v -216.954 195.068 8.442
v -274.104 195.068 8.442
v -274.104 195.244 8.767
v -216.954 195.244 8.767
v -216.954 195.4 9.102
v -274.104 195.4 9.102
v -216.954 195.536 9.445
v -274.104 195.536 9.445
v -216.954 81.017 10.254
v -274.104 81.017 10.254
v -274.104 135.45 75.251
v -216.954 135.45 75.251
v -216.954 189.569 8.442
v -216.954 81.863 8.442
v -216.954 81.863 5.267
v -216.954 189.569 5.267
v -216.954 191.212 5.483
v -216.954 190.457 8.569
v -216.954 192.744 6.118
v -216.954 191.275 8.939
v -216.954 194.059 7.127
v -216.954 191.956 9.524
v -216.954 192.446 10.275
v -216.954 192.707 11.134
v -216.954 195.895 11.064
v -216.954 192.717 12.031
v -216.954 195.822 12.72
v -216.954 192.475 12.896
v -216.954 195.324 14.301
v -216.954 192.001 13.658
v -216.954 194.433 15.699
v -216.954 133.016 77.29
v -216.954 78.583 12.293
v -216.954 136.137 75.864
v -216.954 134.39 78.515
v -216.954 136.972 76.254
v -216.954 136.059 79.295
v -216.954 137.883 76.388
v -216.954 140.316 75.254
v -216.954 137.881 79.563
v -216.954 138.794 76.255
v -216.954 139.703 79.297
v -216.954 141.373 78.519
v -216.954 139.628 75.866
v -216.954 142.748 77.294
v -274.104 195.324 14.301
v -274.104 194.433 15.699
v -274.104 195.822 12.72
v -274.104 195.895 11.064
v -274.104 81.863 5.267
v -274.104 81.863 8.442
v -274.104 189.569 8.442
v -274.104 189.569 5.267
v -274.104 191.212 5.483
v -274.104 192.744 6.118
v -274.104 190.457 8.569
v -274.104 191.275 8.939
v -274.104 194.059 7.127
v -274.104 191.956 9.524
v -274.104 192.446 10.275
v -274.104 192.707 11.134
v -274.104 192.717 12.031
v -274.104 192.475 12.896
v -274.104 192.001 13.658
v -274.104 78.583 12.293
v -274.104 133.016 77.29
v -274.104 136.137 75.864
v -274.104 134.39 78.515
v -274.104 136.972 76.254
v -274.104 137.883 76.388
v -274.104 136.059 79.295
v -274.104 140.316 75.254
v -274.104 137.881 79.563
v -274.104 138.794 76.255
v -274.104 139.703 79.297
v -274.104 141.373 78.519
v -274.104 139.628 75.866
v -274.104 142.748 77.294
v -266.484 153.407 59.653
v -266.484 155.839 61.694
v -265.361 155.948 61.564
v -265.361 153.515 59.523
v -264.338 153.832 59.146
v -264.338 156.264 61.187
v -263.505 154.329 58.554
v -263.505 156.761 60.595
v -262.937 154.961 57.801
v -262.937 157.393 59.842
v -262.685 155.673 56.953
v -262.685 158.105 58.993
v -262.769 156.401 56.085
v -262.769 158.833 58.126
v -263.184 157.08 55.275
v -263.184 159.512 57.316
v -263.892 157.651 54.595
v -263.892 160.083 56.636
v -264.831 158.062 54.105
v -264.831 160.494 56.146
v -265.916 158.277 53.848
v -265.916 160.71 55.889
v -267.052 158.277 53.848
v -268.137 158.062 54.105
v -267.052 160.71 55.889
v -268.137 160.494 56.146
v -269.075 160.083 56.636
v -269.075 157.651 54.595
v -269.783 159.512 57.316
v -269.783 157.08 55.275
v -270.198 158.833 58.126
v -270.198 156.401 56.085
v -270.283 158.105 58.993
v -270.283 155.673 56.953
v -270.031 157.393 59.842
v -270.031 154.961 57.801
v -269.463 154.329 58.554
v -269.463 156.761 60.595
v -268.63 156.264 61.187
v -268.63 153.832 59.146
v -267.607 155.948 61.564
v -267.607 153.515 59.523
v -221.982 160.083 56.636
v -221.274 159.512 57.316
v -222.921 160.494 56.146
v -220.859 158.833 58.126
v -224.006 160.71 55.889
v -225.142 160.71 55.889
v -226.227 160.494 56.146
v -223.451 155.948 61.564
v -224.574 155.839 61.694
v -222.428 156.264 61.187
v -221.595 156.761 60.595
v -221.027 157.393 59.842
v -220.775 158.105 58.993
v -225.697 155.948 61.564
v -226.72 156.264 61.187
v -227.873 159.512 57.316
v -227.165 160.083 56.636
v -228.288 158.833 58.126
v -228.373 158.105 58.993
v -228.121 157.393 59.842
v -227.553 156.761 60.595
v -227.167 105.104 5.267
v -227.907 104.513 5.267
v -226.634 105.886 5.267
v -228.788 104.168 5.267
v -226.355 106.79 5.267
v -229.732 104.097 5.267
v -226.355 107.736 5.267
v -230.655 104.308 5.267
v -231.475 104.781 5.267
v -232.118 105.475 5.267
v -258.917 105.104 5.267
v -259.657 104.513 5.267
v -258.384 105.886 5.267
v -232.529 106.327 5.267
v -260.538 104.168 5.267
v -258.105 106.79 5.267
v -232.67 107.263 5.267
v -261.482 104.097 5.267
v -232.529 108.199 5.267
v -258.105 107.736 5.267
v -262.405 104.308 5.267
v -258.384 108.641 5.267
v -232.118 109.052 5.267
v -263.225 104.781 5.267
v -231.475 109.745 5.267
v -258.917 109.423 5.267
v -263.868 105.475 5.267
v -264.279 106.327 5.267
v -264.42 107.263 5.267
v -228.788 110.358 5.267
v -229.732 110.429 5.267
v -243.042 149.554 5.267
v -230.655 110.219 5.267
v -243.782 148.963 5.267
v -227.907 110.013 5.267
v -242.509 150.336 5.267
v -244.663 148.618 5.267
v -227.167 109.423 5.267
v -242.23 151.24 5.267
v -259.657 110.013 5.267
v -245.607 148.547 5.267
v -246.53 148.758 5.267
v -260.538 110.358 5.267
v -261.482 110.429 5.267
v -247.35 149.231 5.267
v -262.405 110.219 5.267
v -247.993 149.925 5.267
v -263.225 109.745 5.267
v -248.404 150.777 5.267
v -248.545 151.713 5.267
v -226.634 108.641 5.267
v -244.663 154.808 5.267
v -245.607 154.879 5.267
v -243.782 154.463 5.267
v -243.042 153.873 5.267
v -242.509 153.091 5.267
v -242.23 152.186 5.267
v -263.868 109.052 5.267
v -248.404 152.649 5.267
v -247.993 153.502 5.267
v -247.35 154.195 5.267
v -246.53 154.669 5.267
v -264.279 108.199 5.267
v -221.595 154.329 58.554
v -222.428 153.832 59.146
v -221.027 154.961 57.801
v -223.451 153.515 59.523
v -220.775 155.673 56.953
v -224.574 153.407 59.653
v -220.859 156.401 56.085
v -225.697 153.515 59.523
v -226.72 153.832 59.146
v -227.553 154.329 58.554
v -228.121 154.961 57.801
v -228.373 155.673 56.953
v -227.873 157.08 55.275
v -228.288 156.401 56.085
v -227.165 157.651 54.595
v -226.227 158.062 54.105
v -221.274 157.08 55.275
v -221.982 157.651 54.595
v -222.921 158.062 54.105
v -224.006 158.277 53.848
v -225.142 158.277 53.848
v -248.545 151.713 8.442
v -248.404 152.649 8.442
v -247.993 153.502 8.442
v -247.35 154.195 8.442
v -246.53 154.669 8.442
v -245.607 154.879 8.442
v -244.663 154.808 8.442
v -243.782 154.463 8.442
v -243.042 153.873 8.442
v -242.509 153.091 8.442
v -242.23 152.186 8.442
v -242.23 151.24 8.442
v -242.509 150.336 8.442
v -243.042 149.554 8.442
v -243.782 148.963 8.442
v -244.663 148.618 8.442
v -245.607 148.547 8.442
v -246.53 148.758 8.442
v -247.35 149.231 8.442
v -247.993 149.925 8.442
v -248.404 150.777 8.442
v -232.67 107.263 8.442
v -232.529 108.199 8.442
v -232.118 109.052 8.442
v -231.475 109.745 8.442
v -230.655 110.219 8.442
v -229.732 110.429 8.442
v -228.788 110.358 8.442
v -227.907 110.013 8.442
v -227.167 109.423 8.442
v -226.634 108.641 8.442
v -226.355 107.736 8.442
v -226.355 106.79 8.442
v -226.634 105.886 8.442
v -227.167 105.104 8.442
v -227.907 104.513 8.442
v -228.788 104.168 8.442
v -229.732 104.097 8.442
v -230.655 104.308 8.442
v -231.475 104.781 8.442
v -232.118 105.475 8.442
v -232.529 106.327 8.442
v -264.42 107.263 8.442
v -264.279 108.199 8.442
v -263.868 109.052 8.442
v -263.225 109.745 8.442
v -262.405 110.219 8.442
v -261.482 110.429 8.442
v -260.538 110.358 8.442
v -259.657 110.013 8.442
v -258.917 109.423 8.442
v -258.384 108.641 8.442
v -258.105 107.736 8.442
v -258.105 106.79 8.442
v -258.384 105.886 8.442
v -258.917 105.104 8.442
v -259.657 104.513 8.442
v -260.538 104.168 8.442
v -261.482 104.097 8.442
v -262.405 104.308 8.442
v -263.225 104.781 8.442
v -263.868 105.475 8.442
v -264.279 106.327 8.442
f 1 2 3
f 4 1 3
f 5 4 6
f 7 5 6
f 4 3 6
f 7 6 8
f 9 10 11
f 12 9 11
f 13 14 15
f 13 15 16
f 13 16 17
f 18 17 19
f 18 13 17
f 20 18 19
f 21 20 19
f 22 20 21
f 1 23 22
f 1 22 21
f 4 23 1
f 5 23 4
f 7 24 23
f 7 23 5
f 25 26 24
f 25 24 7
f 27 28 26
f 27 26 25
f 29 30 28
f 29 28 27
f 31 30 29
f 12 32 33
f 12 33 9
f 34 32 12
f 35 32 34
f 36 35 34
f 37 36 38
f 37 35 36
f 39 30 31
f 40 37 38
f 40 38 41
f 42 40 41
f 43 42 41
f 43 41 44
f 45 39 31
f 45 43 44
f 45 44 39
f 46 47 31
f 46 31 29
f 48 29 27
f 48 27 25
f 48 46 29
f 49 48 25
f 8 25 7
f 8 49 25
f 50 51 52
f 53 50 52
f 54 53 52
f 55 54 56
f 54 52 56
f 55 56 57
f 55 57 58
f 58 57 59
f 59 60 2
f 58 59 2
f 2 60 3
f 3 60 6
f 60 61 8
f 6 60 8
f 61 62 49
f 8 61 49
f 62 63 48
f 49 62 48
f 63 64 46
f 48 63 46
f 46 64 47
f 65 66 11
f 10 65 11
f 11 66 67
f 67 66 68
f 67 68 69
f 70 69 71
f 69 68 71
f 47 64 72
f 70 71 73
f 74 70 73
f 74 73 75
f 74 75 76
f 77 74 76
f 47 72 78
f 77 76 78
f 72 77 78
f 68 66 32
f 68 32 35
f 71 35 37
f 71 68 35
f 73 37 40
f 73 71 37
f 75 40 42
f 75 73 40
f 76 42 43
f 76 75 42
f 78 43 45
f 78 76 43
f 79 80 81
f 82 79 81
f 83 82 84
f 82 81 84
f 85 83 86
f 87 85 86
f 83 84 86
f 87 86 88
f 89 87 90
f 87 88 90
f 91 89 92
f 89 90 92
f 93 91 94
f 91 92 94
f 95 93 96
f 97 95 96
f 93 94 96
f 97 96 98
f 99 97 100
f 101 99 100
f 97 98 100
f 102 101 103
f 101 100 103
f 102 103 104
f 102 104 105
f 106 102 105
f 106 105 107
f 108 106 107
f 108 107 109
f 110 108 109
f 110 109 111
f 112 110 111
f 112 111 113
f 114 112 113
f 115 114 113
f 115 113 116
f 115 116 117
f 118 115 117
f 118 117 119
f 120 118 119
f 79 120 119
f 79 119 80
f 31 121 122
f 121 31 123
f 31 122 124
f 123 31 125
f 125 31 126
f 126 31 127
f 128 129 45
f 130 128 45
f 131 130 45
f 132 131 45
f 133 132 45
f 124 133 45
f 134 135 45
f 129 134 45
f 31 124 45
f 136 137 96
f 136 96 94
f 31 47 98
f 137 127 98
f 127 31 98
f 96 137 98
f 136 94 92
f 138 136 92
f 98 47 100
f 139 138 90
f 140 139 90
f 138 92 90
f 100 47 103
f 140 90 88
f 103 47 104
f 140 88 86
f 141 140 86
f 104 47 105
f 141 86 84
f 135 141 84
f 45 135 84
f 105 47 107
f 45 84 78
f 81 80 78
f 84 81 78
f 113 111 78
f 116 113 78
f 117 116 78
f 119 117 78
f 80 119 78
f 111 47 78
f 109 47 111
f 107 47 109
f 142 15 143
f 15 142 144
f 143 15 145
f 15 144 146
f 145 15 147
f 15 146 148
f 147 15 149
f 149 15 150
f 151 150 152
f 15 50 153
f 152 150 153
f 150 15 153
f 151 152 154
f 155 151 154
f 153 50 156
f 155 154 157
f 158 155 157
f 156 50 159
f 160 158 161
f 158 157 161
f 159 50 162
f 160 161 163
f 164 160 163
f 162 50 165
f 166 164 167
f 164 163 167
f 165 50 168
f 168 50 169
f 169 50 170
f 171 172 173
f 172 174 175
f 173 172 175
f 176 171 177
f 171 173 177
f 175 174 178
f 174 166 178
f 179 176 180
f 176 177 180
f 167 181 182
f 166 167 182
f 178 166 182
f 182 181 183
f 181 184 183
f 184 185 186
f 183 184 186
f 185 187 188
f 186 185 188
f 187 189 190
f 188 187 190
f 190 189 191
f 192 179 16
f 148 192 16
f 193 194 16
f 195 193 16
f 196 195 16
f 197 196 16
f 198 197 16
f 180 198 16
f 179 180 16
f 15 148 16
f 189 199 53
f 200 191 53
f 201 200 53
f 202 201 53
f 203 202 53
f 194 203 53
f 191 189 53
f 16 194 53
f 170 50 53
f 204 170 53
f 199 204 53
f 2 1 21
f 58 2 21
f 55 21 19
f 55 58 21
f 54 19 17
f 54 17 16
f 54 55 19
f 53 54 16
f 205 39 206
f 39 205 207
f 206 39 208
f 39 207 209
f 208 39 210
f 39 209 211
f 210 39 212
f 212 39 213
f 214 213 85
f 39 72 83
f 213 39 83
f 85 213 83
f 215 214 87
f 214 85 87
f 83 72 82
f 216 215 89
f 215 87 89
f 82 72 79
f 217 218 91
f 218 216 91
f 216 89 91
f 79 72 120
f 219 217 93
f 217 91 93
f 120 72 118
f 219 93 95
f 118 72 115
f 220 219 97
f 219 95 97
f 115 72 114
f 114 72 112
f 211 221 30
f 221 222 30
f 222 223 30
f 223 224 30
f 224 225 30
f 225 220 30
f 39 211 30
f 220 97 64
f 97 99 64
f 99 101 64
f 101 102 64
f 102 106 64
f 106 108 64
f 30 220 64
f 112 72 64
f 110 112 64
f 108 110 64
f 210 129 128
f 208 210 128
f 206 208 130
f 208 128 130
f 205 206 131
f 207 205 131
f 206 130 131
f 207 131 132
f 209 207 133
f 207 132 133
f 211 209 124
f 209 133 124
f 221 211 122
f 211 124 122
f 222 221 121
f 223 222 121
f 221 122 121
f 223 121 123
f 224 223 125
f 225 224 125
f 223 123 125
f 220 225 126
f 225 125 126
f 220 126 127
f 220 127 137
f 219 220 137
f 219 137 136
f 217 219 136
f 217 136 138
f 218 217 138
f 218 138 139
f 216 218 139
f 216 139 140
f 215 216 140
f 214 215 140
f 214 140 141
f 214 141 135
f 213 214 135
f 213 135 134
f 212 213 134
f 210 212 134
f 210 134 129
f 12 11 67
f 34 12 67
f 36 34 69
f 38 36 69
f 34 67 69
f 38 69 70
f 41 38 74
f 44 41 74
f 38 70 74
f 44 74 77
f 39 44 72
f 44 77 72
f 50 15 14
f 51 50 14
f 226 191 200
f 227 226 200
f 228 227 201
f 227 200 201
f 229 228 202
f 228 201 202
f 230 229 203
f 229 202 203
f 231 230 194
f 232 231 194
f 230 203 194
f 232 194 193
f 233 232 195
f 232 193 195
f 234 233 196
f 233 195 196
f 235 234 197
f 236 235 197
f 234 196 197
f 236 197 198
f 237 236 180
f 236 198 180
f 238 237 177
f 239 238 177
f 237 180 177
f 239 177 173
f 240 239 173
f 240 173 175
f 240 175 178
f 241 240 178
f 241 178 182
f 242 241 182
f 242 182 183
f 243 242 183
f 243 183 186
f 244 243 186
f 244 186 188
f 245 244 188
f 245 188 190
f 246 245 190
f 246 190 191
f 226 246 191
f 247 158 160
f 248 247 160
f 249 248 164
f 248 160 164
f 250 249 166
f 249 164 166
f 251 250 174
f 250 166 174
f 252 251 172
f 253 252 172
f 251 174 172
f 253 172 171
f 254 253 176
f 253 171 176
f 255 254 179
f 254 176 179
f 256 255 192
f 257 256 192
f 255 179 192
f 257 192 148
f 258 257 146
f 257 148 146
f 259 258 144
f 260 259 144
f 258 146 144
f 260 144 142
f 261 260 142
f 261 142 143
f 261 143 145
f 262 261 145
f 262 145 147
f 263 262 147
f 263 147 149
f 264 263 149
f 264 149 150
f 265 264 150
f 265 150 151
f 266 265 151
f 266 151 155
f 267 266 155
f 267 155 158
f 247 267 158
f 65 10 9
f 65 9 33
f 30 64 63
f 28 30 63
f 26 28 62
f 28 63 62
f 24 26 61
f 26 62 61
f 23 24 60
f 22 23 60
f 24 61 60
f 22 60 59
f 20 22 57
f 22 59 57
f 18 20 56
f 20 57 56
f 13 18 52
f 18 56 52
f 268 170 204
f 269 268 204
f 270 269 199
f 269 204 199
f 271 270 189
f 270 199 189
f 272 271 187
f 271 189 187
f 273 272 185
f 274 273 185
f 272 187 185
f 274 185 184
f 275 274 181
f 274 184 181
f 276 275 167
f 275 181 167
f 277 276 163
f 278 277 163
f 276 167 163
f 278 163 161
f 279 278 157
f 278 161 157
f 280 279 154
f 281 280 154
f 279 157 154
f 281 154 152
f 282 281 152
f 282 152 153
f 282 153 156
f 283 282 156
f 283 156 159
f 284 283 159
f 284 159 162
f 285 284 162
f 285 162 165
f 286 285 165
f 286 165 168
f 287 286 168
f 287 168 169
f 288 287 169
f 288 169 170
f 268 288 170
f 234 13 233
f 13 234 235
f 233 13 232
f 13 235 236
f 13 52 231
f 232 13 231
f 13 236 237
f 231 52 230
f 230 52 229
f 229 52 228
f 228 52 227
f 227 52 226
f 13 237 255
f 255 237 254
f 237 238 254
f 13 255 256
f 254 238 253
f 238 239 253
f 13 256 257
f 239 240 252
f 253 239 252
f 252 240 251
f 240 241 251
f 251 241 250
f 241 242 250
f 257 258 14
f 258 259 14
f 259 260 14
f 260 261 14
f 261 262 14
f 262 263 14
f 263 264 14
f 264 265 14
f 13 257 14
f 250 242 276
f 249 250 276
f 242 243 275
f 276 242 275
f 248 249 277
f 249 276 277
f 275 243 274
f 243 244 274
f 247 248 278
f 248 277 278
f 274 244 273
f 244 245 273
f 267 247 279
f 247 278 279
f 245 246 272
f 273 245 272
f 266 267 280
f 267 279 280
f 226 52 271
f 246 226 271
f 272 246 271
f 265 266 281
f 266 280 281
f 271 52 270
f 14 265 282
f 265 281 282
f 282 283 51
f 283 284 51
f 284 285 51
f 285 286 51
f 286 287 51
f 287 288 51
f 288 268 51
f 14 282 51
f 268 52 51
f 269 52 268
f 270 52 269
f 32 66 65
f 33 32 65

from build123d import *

# Parameters (mm, degrees)
BOSS_EXTRUDE1_START    = -63.5
BOSS_EXTRUDE1_DEPTH    = 57.15
SKETCH4_R              = 3.81
CUT_EXTRUDE2_DEPTH     = 12.7
CONVERT_SOLID3_START   = -274.103914115
CONVERT_SOLID3_DEPTH   = 57.15
CONVERT_SOLID3_2_DEPTH = 57.15
SKETCH13_R             = 3.175
CUT_EXTRUDE3_DEPTH     = 5.842


# Read off the part's stored shape, not the designer's step: Convert-Solid3
with BuildPart() as part:
    # Sketch3 → Boss-Extrude1 (new body)
    with BuildSketch(Plane.ZY.offset(337.603914115).offset(BOSS_EXTRUDE1_START)):
        Polygon((5.267071178, 203.186586599), (83.097186599, 137.879365455), (5.267071178, 72.698998764), align=None)
        Polygon((78.154944449, 137.881730876), (8.442071178, 196.377777126), (8.442071178, 79.499308876), align=None, mode=Mode.SUBTRACT)
    extrude(amount=-BOSS_EXTRUDE1_DEPTH)

    # Sketch4 → Cut-Extrude2 (cut)
    with BuildSketch(Plane(origin=(0, 121.82830981, 102.226089829), x_dir=(1, 0, 0), z_dir=(0, 0.7660444431189748, 0.6427876096865434))):
        with Locations(Location((-266.483914115, 56.721009713, 0), (0, 0, 270))):
            Circle(SKETCH4_R)
        with Locations(Location((-224.573914115, 56.721009713, 0), (0, 0, 270))):
            Circle(SKETCH4_R)
    extrude(amount=-CUT_EXTRUDE2_DEPTH, mode=Mode.SUBTRACT)

    # Convert-Solid3 outline → Convert-Solid3 (cut)
    with BuildSketch(Plane.YZ.offset(CONVERT_SOLID3_START)):
        Polygon((72.698998764, 5.267071178), (81.863084577, 5.267071178), (81.863084577, 8.442071178), (79.499308876, 8.442071178), (81.016980609, 10.254282003), (78.582837061, 12.292803573), align=None)
        with BuildLine():
            ThreePointArc((195.068228967, 8.442071178), (192.743967654, 6.117809864), (189.568967654, 5.267071178))
            Line((189.568967654, 5.267071178), (203.186586599, 5.267071178))
            Line((203.186586599, 5.267071178), (194.433349867, 15.6987725))
            ThreePointArc((194.433349867, 15.6987725), (195.822496885, 12.719737106), (195.536015795, 9.445243268))
            Line((195.536015795, 9.445243268), (196.377777126, 8.442071178))
            Line((196.377777126, 8.442071178), (195.068228967, 8.442071178))
        make_face()
        with BuildLine():
            Line((137.879365455, 83.097186599), (133.015809203, 77.289745437))
            ThreePointArc((133.015809203, 77.289745437), (137.881057106, 79.562701571), (142.748478512, 77.29440362))
            Line((142.748478512, 77.29440362), (137.879365455, 83.097186599))
        make_face()
    extrude(amount=CONVERT_SOLID3_DEPTH, mode=Mode.SUBTRACT)

    # Convert-Solid3 2 outline → Convert-Solid3 2 (add)
    with BuildSketch(Plane.YZ.offset(CONVERT_SOLID3_START)):
        with BuildLine():
            ThreePointArc((192.001158761, 13.657921839), (192.446494877, 10.275258197), (189.568967654, 8.442071178))
            Line((189.568967654, 8.442071178), (195.068228967, 8.442071178))
            ThreePointArc((195.068228967, 8.442071178), (195.324022101, 8.933445216), (195.536015795, 9.445243268))
            Line((195.536015795, 9.445243268), (192.001158761, 13.657921839))
        make_face()
        with BuildLine():
            ThreePointArc((135.44995275, 75.251223868), (137.882576702, 76.387701935), (140.316287405, 75.253552959))
            Line((140.316287405, 75.253552959), (137.881730876, 78.154944449))
            Line((137.881730876, 78.154944449), (135.44995275, 75.251223868))
        make_face()
    extrude(amount=CONVERT_SOLID3_2_DEPTH)

    # Sketch13 → Cut-Extrude3 (cut)
    with BuildSketch(Plane(origin=(0, 0, 5.267071178), x_dir=(-1, 0, 0), z_dir=(0, 0, -1))):
        with Locations((229.4949236, 107.263084577)):
            Circle(SKETCH13_R)
        with Locations((261.2449236, 107.263084577)):
            Circle(SKETCH13_R)
        with Locations((245.3699236, 151.713084577)):
            Circle(SKETCH13_R)
    extrude(amount=-CUT_EXTRUDE3_DEPTH, mode=Mode.SUBTRACT)


solid = part.part
